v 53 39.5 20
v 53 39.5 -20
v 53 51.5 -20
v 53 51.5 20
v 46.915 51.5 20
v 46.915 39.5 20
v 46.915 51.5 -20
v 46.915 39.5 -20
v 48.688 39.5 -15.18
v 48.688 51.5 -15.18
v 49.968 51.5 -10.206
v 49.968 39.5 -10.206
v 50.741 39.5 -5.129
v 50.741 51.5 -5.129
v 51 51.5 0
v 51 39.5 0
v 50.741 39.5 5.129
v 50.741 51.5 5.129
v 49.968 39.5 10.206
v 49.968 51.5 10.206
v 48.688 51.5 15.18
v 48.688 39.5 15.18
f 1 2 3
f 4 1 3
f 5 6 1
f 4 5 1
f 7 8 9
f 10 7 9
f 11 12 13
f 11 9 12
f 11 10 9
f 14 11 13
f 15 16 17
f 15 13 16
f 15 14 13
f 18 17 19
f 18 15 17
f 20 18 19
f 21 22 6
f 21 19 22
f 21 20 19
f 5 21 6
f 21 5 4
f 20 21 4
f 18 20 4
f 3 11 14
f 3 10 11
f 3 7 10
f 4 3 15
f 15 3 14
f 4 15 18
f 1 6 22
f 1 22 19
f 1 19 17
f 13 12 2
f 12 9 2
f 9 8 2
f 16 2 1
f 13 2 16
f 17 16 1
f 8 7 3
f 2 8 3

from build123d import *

# Parameters (mm, degrees)
CYLINDER014005822_R     = 51
CYLINDER014005822_DEPTH = 12
BOX001_W                = 10
BOX001_H                = 12
BOX001_DEPTH            = 40


with BuildPart() as v_lec735:
    # Cylinder014005822 → Cylinder014005822 (new body)
    with BuildSketch(Plane.XZ.offset(-51.5)):
        Circle(CYLINDER014005822_R)
    extrude(amount=CYLINDER014005822_DEPTH)


with BuildPart() as lista_prac:
    # Box001 → Box001 (new body)
    with BuildSketch(Plane(origin=(43, 39.5, -20), x_dir=(1, 0, 0), z_dir=(0, 0, 1))):
        with Locations((5, 6)):
            Rectangle(BOX001_W, BOX001_H)
    extrude(amount=BOX001_DEPTH)

    # Cut009003003003: cut Válec735
    add(v_lec735.part, mode=Mode.SUBTRACT)


solid = lista_prac.part
